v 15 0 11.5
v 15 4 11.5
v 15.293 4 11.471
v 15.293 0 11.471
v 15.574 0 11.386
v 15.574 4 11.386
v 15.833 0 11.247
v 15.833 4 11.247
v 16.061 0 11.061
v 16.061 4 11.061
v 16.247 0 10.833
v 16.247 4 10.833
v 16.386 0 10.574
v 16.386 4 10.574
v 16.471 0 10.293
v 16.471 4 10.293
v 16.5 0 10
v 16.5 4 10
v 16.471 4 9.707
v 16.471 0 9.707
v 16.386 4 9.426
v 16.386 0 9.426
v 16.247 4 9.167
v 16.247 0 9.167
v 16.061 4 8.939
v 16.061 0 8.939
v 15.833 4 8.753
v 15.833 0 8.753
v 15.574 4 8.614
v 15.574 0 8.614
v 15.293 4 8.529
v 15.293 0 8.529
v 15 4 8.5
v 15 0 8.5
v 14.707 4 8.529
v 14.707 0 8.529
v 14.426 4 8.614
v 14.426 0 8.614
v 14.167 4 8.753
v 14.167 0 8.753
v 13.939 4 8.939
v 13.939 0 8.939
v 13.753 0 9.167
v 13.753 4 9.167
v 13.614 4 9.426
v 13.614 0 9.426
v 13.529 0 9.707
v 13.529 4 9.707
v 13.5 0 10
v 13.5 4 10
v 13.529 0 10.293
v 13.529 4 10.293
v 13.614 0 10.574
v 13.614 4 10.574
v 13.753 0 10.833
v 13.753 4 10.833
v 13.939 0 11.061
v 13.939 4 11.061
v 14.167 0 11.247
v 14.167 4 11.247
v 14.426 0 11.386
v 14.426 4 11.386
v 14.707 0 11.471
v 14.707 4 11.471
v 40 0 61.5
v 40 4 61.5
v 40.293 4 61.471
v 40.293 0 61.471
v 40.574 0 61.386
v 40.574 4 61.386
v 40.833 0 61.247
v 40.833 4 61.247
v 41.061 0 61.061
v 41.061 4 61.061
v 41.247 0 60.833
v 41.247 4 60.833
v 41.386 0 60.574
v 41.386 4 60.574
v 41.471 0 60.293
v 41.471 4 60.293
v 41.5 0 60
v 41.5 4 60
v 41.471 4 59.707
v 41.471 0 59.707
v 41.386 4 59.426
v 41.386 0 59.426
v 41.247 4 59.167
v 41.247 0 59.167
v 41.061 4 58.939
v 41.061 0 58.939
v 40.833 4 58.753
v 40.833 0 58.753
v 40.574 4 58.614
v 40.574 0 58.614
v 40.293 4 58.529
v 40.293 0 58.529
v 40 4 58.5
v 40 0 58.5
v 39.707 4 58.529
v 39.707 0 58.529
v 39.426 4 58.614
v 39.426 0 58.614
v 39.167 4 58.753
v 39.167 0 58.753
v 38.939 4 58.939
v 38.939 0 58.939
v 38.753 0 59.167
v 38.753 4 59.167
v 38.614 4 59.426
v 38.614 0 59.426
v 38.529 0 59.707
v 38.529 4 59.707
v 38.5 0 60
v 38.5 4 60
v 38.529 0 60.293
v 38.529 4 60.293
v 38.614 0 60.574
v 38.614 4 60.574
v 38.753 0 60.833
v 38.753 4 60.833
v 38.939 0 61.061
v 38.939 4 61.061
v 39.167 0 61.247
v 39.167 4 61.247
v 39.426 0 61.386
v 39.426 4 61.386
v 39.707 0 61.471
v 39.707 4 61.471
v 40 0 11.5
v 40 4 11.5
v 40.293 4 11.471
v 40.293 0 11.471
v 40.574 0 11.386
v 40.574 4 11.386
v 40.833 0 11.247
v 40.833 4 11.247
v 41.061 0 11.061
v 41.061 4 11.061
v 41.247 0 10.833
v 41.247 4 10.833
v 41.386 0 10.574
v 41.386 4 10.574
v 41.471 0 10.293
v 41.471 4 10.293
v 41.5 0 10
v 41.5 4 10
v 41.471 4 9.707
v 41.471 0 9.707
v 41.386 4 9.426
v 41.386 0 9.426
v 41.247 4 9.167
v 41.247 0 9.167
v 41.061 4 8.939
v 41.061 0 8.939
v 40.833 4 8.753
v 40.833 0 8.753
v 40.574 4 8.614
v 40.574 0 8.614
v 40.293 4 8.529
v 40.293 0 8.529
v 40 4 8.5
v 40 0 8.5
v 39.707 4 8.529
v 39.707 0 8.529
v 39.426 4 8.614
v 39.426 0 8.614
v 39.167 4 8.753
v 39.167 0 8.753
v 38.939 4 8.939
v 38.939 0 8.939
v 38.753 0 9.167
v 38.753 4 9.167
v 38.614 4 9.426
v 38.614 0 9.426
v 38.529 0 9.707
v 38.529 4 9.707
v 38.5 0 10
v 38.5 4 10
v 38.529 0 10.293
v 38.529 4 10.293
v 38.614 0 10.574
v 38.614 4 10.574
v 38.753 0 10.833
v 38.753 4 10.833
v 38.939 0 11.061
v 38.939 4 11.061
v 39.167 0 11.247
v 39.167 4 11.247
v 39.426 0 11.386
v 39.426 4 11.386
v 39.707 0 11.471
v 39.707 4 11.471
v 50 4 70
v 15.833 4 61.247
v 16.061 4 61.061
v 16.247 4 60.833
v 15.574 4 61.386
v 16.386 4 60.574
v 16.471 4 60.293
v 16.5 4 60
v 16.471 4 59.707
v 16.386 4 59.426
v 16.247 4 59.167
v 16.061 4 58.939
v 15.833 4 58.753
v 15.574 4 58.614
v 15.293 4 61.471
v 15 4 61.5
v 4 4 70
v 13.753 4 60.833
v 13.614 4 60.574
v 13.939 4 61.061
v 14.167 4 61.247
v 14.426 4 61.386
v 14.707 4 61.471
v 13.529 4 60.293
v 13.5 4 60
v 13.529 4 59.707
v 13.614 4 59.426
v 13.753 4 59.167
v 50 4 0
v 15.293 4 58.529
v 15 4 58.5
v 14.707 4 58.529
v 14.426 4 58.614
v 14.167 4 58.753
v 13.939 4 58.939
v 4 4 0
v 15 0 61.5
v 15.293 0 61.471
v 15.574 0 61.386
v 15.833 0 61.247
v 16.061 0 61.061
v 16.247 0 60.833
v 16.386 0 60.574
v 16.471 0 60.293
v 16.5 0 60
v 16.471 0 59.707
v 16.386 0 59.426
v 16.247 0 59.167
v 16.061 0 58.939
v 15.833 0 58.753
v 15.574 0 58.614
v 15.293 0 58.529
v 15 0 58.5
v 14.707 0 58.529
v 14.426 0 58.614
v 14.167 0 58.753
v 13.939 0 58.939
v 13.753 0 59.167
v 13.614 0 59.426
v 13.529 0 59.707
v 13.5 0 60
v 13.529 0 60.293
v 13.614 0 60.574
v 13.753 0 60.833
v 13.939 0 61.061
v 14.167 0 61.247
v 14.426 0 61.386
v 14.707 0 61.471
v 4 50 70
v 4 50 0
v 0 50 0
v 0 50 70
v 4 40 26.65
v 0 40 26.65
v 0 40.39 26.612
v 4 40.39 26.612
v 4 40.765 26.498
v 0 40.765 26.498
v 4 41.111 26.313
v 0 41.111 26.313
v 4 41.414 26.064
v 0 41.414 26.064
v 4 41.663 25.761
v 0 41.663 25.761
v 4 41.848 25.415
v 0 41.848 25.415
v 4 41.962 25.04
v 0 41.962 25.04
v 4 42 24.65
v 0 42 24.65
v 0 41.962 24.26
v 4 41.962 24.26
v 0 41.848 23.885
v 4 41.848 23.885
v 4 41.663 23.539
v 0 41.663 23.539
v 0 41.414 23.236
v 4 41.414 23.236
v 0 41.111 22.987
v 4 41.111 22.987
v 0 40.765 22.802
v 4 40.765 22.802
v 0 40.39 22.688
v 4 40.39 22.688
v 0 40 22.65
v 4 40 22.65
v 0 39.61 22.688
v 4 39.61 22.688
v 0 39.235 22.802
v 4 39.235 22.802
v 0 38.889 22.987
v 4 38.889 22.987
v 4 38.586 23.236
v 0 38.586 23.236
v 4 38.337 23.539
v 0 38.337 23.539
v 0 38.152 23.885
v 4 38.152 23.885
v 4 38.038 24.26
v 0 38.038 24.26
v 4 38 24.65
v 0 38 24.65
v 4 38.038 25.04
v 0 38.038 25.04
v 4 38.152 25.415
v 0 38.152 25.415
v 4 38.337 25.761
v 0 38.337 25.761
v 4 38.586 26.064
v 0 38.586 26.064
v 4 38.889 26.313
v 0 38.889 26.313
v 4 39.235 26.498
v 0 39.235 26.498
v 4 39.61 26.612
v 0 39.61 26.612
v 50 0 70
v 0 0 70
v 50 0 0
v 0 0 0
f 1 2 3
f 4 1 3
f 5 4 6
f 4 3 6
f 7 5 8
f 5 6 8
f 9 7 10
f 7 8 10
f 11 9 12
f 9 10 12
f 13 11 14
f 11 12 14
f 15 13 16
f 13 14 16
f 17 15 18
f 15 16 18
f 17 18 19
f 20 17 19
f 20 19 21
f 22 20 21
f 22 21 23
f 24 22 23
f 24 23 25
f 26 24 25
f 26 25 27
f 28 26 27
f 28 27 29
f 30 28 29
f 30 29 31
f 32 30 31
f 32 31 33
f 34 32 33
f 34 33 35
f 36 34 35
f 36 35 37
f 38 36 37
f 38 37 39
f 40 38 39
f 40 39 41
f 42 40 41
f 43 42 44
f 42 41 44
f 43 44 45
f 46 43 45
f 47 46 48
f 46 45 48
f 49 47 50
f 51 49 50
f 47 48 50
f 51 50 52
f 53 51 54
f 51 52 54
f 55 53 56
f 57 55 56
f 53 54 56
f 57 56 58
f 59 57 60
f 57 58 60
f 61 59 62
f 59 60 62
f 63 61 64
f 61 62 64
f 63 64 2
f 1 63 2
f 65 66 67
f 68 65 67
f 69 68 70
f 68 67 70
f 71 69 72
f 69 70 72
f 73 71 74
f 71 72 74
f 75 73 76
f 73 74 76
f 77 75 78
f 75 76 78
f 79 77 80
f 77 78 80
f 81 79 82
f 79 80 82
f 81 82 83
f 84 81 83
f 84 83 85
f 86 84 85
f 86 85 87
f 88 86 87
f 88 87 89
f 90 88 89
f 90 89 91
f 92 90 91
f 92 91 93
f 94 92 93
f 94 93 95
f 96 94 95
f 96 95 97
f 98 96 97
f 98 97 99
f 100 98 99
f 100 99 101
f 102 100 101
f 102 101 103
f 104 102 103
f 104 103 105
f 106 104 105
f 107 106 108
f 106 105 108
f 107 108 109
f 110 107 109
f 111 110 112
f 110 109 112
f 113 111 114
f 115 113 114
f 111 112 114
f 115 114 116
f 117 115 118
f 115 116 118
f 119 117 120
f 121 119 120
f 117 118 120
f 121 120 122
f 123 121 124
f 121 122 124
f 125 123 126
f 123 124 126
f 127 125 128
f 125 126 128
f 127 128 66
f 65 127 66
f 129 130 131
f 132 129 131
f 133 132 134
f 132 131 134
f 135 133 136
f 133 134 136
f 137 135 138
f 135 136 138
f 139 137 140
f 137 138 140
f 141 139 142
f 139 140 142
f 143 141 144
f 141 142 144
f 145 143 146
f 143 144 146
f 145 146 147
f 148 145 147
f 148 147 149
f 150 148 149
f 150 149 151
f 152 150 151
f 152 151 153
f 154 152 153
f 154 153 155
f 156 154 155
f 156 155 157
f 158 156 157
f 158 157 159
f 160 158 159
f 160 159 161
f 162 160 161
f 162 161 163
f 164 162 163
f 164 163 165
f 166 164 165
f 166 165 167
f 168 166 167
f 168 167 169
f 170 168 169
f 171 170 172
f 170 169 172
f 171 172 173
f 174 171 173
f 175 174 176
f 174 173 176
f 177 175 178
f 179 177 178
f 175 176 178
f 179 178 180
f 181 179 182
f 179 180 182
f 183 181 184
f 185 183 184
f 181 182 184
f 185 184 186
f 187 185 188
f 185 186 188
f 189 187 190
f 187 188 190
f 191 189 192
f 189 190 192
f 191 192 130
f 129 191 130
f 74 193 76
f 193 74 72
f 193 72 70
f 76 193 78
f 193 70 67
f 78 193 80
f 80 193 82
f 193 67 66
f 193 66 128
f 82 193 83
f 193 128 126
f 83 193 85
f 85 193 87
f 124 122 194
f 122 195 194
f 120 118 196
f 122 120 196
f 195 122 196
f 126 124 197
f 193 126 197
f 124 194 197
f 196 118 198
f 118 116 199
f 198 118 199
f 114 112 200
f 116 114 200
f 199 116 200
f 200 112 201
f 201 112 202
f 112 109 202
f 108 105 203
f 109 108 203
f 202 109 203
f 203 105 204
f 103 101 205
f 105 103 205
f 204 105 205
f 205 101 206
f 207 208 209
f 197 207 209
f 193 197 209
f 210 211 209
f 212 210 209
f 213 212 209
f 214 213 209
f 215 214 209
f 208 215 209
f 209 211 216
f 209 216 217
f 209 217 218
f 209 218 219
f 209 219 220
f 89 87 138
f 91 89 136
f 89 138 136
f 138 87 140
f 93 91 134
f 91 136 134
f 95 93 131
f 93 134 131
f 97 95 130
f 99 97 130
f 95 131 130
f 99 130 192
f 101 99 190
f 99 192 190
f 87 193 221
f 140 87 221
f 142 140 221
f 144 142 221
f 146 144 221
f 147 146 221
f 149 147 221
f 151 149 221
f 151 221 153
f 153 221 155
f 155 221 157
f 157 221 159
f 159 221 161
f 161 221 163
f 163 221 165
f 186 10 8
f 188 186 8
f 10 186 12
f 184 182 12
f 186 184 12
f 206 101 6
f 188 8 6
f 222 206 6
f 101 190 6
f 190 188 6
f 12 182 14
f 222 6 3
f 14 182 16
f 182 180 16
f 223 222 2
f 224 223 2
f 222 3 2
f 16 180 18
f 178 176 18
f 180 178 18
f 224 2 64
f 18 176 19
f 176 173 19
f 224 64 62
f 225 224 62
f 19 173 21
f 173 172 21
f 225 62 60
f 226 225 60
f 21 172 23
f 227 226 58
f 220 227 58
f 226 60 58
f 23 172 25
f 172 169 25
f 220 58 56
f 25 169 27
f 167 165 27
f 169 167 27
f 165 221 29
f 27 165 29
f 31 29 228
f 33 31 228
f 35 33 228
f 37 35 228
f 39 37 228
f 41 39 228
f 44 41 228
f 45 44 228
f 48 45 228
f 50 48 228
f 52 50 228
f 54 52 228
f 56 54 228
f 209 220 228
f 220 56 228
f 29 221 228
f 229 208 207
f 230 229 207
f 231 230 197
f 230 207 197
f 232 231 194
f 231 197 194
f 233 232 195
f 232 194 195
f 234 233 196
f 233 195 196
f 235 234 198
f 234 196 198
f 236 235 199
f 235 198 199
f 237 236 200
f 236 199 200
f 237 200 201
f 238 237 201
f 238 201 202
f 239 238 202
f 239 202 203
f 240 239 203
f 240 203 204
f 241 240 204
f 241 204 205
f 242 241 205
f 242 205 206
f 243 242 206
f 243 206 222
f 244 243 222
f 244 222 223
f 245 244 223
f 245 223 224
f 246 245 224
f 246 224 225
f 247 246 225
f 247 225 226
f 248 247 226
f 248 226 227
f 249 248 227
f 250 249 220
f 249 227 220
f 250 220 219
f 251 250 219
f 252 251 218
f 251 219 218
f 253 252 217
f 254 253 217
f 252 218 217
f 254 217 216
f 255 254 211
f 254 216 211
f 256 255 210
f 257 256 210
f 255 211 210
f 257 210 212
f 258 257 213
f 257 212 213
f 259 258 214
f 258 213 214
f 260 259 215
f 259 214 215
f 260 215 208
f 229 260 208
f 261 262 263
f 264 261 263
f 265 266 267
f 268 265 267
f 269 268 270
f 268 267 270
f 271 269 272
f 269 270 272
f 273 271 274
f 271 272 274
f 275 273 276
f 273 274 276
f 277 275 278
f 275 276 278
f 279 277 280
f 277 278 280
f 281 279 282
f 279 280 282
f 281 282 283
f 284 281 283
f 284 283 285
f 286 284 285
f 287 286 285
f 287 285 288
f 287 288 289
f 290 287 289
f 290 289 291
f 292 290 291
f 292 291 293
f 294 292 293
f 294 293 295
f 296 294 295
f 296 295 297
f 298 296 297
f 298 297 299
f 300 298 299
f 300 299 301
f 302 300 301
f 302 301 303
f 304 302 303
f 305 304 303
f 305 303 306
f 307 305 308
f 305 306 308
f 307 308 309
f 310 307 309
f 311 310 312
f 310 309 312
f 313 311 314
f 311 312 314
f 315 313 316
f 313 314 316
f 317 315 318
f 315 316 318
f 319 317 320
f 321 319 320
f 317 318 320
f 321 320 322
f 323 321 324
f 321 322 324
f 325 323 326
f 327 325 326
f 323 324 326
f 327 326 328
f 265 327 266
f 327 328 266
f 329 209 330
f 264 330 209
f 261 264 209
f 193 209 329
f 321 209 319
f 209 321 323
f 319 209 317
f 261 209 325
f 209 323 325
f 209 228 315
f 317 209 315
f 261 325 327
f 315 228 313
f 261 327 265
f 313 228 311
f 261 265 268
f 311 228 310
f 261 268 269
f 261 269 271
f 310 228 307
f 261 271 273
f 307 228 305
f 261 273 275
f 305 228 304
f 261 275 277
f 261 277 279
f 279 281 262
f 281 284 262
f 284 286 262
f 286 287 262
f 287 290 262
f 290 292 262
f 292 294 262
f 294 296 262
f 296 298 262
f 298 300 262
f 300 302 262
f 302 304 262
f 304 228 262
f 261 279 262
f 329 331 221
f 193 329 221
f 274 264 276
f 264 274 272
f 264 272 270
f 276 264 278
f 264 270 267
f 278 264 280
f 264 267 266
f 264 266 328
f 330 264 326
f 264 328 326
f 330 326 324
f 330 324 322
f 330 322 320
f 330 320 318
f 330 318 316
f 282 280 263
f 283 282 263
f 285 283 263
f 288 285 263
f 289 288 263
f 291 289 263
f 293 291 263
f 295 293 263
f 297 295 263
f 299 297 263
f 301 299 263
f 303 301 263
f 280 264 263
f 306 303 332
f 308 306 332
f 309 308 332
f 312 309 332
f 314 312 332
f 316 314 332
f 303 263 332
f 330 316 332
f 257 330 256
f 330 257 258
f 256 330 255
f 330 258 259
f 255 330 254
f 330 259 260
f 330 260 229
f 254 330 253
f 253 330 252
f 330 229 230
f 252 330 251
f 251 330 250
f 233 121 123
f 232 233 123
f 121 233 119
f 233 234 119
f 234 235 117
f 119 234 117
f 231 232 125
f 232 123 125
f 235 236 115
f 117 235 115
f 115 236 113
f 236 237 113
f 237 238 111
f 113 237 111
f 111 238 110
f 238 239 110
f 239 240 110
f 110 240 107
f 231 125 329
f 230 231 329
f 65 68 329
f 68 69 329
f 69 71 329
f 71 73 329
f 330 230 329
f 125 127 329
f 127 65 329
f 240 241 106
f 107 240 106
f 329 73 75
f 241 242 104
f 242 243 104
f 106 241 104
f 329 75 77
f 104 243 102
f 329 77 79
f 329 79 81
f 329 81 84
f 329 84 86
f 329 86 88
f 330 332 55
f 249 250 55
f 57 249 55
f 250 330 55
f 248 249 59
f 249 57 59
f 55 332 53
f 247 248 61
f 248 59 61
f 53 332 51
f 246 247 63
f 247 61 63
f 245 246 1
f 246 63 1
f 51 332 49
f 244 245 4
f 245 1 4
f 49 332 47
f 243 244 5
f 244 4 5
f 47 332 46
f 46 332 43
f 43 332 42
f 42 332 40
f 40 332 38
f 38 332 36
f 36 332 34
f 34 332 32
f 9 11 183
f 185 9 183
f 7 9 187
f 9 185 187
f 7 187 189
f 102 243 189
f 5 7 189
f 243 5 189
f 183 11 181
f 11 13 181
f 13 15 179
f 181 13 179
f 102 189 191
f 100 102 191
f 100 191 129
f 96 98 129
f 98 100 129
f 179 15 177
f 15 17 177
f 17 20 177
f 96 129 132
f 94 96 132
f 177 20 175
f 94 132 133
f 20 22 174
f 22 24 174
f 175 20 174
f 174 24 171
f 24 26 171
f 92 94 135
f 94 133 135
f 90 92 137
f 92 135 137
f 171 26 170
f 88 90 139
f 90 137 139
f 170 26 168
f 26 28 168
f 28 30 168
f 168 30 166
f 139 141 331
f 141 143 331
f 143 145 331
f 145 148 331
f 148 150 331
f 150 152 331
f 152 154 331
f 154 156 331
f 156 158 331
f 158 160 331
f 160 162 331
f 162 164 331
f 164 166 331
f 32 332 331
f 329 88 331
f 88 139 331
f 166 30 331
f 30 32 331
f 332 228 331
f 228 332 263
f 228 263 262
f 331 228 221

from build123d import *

# Parameters (mm, degrees)
EXTRUSION1_DEPTH                = 70
ESQUISSE2_R                     = 1.5
EXTRUSION2_DEPTH                = 98.549987186
R_P_TITION_LIN_AIRE1_COUNT      = 2
R_P_TITION_LIN_AIRE1_PITCH      = 50
R_P_TITION_LIN_AIRE1_COUNT_DIR2 = 2
R_P_TITION_LIN_AIRE1_PITCH_DIR2 = 25
ESQUISSE3_R                     = 2
ENL_V_MAT_EXTRU_1_DEPTH         = 10


with BuildPart() as part:
    # Esquisse1 → Extrusion1 (new body)
    with BuildSketch(Plane.XY):
        Polygon((0, 0), (4, 0), (50, 0), (50, 4), (4, 4), (4, 50), (0, 50), align=None)
    extrude(amount=EXTRUSION1_DEPTH)

    # Esquisse2 → Extrusion2 (cut, through all)
    with BuildSketch(Plane(origin=(0, 4, 0), x_dir=(1, 0, 0), z_dir=(0, 1, 0))):
        with Locations(Location((40, -60, 0), (0, 0, 270))):
            Circle(ESQUISSE2_R)
    extrusion2 = extrude(amount=-EXTRUSION2_DEPTH, mode=Mode.SUBTRACT)

    # Répétition linéaire1: Extrusion2 2 × 2
    with Locations(*[(-j * R_P_TITION_LIN_AIRE1_PITCH_DIR2, 0, -i * R_P_TITION_LIN_AIRE1_PITCH) for i in range(R_P_TITION_LIN_AIRE1_COUNT) for j in range(R_P_TITION_LIN_AIRE1_COUNT_DIR2) if (i, j) != (0, 0)]):
        add(extrusion2, mode=Mode.SUBTRACT)

    # Esquisse3 → Enlèv. mat.-Extru.1 (cut)
    with BuildSketch(Plane.ZY):
        with Locations((24.65, 40)):
            Circle(ESQUISSE3_R)
    extrude(amount=-ENL_V_MAT_EXTRU_1_DEPTH, mode=Mode.SUBTRACT)


solid = part.part
